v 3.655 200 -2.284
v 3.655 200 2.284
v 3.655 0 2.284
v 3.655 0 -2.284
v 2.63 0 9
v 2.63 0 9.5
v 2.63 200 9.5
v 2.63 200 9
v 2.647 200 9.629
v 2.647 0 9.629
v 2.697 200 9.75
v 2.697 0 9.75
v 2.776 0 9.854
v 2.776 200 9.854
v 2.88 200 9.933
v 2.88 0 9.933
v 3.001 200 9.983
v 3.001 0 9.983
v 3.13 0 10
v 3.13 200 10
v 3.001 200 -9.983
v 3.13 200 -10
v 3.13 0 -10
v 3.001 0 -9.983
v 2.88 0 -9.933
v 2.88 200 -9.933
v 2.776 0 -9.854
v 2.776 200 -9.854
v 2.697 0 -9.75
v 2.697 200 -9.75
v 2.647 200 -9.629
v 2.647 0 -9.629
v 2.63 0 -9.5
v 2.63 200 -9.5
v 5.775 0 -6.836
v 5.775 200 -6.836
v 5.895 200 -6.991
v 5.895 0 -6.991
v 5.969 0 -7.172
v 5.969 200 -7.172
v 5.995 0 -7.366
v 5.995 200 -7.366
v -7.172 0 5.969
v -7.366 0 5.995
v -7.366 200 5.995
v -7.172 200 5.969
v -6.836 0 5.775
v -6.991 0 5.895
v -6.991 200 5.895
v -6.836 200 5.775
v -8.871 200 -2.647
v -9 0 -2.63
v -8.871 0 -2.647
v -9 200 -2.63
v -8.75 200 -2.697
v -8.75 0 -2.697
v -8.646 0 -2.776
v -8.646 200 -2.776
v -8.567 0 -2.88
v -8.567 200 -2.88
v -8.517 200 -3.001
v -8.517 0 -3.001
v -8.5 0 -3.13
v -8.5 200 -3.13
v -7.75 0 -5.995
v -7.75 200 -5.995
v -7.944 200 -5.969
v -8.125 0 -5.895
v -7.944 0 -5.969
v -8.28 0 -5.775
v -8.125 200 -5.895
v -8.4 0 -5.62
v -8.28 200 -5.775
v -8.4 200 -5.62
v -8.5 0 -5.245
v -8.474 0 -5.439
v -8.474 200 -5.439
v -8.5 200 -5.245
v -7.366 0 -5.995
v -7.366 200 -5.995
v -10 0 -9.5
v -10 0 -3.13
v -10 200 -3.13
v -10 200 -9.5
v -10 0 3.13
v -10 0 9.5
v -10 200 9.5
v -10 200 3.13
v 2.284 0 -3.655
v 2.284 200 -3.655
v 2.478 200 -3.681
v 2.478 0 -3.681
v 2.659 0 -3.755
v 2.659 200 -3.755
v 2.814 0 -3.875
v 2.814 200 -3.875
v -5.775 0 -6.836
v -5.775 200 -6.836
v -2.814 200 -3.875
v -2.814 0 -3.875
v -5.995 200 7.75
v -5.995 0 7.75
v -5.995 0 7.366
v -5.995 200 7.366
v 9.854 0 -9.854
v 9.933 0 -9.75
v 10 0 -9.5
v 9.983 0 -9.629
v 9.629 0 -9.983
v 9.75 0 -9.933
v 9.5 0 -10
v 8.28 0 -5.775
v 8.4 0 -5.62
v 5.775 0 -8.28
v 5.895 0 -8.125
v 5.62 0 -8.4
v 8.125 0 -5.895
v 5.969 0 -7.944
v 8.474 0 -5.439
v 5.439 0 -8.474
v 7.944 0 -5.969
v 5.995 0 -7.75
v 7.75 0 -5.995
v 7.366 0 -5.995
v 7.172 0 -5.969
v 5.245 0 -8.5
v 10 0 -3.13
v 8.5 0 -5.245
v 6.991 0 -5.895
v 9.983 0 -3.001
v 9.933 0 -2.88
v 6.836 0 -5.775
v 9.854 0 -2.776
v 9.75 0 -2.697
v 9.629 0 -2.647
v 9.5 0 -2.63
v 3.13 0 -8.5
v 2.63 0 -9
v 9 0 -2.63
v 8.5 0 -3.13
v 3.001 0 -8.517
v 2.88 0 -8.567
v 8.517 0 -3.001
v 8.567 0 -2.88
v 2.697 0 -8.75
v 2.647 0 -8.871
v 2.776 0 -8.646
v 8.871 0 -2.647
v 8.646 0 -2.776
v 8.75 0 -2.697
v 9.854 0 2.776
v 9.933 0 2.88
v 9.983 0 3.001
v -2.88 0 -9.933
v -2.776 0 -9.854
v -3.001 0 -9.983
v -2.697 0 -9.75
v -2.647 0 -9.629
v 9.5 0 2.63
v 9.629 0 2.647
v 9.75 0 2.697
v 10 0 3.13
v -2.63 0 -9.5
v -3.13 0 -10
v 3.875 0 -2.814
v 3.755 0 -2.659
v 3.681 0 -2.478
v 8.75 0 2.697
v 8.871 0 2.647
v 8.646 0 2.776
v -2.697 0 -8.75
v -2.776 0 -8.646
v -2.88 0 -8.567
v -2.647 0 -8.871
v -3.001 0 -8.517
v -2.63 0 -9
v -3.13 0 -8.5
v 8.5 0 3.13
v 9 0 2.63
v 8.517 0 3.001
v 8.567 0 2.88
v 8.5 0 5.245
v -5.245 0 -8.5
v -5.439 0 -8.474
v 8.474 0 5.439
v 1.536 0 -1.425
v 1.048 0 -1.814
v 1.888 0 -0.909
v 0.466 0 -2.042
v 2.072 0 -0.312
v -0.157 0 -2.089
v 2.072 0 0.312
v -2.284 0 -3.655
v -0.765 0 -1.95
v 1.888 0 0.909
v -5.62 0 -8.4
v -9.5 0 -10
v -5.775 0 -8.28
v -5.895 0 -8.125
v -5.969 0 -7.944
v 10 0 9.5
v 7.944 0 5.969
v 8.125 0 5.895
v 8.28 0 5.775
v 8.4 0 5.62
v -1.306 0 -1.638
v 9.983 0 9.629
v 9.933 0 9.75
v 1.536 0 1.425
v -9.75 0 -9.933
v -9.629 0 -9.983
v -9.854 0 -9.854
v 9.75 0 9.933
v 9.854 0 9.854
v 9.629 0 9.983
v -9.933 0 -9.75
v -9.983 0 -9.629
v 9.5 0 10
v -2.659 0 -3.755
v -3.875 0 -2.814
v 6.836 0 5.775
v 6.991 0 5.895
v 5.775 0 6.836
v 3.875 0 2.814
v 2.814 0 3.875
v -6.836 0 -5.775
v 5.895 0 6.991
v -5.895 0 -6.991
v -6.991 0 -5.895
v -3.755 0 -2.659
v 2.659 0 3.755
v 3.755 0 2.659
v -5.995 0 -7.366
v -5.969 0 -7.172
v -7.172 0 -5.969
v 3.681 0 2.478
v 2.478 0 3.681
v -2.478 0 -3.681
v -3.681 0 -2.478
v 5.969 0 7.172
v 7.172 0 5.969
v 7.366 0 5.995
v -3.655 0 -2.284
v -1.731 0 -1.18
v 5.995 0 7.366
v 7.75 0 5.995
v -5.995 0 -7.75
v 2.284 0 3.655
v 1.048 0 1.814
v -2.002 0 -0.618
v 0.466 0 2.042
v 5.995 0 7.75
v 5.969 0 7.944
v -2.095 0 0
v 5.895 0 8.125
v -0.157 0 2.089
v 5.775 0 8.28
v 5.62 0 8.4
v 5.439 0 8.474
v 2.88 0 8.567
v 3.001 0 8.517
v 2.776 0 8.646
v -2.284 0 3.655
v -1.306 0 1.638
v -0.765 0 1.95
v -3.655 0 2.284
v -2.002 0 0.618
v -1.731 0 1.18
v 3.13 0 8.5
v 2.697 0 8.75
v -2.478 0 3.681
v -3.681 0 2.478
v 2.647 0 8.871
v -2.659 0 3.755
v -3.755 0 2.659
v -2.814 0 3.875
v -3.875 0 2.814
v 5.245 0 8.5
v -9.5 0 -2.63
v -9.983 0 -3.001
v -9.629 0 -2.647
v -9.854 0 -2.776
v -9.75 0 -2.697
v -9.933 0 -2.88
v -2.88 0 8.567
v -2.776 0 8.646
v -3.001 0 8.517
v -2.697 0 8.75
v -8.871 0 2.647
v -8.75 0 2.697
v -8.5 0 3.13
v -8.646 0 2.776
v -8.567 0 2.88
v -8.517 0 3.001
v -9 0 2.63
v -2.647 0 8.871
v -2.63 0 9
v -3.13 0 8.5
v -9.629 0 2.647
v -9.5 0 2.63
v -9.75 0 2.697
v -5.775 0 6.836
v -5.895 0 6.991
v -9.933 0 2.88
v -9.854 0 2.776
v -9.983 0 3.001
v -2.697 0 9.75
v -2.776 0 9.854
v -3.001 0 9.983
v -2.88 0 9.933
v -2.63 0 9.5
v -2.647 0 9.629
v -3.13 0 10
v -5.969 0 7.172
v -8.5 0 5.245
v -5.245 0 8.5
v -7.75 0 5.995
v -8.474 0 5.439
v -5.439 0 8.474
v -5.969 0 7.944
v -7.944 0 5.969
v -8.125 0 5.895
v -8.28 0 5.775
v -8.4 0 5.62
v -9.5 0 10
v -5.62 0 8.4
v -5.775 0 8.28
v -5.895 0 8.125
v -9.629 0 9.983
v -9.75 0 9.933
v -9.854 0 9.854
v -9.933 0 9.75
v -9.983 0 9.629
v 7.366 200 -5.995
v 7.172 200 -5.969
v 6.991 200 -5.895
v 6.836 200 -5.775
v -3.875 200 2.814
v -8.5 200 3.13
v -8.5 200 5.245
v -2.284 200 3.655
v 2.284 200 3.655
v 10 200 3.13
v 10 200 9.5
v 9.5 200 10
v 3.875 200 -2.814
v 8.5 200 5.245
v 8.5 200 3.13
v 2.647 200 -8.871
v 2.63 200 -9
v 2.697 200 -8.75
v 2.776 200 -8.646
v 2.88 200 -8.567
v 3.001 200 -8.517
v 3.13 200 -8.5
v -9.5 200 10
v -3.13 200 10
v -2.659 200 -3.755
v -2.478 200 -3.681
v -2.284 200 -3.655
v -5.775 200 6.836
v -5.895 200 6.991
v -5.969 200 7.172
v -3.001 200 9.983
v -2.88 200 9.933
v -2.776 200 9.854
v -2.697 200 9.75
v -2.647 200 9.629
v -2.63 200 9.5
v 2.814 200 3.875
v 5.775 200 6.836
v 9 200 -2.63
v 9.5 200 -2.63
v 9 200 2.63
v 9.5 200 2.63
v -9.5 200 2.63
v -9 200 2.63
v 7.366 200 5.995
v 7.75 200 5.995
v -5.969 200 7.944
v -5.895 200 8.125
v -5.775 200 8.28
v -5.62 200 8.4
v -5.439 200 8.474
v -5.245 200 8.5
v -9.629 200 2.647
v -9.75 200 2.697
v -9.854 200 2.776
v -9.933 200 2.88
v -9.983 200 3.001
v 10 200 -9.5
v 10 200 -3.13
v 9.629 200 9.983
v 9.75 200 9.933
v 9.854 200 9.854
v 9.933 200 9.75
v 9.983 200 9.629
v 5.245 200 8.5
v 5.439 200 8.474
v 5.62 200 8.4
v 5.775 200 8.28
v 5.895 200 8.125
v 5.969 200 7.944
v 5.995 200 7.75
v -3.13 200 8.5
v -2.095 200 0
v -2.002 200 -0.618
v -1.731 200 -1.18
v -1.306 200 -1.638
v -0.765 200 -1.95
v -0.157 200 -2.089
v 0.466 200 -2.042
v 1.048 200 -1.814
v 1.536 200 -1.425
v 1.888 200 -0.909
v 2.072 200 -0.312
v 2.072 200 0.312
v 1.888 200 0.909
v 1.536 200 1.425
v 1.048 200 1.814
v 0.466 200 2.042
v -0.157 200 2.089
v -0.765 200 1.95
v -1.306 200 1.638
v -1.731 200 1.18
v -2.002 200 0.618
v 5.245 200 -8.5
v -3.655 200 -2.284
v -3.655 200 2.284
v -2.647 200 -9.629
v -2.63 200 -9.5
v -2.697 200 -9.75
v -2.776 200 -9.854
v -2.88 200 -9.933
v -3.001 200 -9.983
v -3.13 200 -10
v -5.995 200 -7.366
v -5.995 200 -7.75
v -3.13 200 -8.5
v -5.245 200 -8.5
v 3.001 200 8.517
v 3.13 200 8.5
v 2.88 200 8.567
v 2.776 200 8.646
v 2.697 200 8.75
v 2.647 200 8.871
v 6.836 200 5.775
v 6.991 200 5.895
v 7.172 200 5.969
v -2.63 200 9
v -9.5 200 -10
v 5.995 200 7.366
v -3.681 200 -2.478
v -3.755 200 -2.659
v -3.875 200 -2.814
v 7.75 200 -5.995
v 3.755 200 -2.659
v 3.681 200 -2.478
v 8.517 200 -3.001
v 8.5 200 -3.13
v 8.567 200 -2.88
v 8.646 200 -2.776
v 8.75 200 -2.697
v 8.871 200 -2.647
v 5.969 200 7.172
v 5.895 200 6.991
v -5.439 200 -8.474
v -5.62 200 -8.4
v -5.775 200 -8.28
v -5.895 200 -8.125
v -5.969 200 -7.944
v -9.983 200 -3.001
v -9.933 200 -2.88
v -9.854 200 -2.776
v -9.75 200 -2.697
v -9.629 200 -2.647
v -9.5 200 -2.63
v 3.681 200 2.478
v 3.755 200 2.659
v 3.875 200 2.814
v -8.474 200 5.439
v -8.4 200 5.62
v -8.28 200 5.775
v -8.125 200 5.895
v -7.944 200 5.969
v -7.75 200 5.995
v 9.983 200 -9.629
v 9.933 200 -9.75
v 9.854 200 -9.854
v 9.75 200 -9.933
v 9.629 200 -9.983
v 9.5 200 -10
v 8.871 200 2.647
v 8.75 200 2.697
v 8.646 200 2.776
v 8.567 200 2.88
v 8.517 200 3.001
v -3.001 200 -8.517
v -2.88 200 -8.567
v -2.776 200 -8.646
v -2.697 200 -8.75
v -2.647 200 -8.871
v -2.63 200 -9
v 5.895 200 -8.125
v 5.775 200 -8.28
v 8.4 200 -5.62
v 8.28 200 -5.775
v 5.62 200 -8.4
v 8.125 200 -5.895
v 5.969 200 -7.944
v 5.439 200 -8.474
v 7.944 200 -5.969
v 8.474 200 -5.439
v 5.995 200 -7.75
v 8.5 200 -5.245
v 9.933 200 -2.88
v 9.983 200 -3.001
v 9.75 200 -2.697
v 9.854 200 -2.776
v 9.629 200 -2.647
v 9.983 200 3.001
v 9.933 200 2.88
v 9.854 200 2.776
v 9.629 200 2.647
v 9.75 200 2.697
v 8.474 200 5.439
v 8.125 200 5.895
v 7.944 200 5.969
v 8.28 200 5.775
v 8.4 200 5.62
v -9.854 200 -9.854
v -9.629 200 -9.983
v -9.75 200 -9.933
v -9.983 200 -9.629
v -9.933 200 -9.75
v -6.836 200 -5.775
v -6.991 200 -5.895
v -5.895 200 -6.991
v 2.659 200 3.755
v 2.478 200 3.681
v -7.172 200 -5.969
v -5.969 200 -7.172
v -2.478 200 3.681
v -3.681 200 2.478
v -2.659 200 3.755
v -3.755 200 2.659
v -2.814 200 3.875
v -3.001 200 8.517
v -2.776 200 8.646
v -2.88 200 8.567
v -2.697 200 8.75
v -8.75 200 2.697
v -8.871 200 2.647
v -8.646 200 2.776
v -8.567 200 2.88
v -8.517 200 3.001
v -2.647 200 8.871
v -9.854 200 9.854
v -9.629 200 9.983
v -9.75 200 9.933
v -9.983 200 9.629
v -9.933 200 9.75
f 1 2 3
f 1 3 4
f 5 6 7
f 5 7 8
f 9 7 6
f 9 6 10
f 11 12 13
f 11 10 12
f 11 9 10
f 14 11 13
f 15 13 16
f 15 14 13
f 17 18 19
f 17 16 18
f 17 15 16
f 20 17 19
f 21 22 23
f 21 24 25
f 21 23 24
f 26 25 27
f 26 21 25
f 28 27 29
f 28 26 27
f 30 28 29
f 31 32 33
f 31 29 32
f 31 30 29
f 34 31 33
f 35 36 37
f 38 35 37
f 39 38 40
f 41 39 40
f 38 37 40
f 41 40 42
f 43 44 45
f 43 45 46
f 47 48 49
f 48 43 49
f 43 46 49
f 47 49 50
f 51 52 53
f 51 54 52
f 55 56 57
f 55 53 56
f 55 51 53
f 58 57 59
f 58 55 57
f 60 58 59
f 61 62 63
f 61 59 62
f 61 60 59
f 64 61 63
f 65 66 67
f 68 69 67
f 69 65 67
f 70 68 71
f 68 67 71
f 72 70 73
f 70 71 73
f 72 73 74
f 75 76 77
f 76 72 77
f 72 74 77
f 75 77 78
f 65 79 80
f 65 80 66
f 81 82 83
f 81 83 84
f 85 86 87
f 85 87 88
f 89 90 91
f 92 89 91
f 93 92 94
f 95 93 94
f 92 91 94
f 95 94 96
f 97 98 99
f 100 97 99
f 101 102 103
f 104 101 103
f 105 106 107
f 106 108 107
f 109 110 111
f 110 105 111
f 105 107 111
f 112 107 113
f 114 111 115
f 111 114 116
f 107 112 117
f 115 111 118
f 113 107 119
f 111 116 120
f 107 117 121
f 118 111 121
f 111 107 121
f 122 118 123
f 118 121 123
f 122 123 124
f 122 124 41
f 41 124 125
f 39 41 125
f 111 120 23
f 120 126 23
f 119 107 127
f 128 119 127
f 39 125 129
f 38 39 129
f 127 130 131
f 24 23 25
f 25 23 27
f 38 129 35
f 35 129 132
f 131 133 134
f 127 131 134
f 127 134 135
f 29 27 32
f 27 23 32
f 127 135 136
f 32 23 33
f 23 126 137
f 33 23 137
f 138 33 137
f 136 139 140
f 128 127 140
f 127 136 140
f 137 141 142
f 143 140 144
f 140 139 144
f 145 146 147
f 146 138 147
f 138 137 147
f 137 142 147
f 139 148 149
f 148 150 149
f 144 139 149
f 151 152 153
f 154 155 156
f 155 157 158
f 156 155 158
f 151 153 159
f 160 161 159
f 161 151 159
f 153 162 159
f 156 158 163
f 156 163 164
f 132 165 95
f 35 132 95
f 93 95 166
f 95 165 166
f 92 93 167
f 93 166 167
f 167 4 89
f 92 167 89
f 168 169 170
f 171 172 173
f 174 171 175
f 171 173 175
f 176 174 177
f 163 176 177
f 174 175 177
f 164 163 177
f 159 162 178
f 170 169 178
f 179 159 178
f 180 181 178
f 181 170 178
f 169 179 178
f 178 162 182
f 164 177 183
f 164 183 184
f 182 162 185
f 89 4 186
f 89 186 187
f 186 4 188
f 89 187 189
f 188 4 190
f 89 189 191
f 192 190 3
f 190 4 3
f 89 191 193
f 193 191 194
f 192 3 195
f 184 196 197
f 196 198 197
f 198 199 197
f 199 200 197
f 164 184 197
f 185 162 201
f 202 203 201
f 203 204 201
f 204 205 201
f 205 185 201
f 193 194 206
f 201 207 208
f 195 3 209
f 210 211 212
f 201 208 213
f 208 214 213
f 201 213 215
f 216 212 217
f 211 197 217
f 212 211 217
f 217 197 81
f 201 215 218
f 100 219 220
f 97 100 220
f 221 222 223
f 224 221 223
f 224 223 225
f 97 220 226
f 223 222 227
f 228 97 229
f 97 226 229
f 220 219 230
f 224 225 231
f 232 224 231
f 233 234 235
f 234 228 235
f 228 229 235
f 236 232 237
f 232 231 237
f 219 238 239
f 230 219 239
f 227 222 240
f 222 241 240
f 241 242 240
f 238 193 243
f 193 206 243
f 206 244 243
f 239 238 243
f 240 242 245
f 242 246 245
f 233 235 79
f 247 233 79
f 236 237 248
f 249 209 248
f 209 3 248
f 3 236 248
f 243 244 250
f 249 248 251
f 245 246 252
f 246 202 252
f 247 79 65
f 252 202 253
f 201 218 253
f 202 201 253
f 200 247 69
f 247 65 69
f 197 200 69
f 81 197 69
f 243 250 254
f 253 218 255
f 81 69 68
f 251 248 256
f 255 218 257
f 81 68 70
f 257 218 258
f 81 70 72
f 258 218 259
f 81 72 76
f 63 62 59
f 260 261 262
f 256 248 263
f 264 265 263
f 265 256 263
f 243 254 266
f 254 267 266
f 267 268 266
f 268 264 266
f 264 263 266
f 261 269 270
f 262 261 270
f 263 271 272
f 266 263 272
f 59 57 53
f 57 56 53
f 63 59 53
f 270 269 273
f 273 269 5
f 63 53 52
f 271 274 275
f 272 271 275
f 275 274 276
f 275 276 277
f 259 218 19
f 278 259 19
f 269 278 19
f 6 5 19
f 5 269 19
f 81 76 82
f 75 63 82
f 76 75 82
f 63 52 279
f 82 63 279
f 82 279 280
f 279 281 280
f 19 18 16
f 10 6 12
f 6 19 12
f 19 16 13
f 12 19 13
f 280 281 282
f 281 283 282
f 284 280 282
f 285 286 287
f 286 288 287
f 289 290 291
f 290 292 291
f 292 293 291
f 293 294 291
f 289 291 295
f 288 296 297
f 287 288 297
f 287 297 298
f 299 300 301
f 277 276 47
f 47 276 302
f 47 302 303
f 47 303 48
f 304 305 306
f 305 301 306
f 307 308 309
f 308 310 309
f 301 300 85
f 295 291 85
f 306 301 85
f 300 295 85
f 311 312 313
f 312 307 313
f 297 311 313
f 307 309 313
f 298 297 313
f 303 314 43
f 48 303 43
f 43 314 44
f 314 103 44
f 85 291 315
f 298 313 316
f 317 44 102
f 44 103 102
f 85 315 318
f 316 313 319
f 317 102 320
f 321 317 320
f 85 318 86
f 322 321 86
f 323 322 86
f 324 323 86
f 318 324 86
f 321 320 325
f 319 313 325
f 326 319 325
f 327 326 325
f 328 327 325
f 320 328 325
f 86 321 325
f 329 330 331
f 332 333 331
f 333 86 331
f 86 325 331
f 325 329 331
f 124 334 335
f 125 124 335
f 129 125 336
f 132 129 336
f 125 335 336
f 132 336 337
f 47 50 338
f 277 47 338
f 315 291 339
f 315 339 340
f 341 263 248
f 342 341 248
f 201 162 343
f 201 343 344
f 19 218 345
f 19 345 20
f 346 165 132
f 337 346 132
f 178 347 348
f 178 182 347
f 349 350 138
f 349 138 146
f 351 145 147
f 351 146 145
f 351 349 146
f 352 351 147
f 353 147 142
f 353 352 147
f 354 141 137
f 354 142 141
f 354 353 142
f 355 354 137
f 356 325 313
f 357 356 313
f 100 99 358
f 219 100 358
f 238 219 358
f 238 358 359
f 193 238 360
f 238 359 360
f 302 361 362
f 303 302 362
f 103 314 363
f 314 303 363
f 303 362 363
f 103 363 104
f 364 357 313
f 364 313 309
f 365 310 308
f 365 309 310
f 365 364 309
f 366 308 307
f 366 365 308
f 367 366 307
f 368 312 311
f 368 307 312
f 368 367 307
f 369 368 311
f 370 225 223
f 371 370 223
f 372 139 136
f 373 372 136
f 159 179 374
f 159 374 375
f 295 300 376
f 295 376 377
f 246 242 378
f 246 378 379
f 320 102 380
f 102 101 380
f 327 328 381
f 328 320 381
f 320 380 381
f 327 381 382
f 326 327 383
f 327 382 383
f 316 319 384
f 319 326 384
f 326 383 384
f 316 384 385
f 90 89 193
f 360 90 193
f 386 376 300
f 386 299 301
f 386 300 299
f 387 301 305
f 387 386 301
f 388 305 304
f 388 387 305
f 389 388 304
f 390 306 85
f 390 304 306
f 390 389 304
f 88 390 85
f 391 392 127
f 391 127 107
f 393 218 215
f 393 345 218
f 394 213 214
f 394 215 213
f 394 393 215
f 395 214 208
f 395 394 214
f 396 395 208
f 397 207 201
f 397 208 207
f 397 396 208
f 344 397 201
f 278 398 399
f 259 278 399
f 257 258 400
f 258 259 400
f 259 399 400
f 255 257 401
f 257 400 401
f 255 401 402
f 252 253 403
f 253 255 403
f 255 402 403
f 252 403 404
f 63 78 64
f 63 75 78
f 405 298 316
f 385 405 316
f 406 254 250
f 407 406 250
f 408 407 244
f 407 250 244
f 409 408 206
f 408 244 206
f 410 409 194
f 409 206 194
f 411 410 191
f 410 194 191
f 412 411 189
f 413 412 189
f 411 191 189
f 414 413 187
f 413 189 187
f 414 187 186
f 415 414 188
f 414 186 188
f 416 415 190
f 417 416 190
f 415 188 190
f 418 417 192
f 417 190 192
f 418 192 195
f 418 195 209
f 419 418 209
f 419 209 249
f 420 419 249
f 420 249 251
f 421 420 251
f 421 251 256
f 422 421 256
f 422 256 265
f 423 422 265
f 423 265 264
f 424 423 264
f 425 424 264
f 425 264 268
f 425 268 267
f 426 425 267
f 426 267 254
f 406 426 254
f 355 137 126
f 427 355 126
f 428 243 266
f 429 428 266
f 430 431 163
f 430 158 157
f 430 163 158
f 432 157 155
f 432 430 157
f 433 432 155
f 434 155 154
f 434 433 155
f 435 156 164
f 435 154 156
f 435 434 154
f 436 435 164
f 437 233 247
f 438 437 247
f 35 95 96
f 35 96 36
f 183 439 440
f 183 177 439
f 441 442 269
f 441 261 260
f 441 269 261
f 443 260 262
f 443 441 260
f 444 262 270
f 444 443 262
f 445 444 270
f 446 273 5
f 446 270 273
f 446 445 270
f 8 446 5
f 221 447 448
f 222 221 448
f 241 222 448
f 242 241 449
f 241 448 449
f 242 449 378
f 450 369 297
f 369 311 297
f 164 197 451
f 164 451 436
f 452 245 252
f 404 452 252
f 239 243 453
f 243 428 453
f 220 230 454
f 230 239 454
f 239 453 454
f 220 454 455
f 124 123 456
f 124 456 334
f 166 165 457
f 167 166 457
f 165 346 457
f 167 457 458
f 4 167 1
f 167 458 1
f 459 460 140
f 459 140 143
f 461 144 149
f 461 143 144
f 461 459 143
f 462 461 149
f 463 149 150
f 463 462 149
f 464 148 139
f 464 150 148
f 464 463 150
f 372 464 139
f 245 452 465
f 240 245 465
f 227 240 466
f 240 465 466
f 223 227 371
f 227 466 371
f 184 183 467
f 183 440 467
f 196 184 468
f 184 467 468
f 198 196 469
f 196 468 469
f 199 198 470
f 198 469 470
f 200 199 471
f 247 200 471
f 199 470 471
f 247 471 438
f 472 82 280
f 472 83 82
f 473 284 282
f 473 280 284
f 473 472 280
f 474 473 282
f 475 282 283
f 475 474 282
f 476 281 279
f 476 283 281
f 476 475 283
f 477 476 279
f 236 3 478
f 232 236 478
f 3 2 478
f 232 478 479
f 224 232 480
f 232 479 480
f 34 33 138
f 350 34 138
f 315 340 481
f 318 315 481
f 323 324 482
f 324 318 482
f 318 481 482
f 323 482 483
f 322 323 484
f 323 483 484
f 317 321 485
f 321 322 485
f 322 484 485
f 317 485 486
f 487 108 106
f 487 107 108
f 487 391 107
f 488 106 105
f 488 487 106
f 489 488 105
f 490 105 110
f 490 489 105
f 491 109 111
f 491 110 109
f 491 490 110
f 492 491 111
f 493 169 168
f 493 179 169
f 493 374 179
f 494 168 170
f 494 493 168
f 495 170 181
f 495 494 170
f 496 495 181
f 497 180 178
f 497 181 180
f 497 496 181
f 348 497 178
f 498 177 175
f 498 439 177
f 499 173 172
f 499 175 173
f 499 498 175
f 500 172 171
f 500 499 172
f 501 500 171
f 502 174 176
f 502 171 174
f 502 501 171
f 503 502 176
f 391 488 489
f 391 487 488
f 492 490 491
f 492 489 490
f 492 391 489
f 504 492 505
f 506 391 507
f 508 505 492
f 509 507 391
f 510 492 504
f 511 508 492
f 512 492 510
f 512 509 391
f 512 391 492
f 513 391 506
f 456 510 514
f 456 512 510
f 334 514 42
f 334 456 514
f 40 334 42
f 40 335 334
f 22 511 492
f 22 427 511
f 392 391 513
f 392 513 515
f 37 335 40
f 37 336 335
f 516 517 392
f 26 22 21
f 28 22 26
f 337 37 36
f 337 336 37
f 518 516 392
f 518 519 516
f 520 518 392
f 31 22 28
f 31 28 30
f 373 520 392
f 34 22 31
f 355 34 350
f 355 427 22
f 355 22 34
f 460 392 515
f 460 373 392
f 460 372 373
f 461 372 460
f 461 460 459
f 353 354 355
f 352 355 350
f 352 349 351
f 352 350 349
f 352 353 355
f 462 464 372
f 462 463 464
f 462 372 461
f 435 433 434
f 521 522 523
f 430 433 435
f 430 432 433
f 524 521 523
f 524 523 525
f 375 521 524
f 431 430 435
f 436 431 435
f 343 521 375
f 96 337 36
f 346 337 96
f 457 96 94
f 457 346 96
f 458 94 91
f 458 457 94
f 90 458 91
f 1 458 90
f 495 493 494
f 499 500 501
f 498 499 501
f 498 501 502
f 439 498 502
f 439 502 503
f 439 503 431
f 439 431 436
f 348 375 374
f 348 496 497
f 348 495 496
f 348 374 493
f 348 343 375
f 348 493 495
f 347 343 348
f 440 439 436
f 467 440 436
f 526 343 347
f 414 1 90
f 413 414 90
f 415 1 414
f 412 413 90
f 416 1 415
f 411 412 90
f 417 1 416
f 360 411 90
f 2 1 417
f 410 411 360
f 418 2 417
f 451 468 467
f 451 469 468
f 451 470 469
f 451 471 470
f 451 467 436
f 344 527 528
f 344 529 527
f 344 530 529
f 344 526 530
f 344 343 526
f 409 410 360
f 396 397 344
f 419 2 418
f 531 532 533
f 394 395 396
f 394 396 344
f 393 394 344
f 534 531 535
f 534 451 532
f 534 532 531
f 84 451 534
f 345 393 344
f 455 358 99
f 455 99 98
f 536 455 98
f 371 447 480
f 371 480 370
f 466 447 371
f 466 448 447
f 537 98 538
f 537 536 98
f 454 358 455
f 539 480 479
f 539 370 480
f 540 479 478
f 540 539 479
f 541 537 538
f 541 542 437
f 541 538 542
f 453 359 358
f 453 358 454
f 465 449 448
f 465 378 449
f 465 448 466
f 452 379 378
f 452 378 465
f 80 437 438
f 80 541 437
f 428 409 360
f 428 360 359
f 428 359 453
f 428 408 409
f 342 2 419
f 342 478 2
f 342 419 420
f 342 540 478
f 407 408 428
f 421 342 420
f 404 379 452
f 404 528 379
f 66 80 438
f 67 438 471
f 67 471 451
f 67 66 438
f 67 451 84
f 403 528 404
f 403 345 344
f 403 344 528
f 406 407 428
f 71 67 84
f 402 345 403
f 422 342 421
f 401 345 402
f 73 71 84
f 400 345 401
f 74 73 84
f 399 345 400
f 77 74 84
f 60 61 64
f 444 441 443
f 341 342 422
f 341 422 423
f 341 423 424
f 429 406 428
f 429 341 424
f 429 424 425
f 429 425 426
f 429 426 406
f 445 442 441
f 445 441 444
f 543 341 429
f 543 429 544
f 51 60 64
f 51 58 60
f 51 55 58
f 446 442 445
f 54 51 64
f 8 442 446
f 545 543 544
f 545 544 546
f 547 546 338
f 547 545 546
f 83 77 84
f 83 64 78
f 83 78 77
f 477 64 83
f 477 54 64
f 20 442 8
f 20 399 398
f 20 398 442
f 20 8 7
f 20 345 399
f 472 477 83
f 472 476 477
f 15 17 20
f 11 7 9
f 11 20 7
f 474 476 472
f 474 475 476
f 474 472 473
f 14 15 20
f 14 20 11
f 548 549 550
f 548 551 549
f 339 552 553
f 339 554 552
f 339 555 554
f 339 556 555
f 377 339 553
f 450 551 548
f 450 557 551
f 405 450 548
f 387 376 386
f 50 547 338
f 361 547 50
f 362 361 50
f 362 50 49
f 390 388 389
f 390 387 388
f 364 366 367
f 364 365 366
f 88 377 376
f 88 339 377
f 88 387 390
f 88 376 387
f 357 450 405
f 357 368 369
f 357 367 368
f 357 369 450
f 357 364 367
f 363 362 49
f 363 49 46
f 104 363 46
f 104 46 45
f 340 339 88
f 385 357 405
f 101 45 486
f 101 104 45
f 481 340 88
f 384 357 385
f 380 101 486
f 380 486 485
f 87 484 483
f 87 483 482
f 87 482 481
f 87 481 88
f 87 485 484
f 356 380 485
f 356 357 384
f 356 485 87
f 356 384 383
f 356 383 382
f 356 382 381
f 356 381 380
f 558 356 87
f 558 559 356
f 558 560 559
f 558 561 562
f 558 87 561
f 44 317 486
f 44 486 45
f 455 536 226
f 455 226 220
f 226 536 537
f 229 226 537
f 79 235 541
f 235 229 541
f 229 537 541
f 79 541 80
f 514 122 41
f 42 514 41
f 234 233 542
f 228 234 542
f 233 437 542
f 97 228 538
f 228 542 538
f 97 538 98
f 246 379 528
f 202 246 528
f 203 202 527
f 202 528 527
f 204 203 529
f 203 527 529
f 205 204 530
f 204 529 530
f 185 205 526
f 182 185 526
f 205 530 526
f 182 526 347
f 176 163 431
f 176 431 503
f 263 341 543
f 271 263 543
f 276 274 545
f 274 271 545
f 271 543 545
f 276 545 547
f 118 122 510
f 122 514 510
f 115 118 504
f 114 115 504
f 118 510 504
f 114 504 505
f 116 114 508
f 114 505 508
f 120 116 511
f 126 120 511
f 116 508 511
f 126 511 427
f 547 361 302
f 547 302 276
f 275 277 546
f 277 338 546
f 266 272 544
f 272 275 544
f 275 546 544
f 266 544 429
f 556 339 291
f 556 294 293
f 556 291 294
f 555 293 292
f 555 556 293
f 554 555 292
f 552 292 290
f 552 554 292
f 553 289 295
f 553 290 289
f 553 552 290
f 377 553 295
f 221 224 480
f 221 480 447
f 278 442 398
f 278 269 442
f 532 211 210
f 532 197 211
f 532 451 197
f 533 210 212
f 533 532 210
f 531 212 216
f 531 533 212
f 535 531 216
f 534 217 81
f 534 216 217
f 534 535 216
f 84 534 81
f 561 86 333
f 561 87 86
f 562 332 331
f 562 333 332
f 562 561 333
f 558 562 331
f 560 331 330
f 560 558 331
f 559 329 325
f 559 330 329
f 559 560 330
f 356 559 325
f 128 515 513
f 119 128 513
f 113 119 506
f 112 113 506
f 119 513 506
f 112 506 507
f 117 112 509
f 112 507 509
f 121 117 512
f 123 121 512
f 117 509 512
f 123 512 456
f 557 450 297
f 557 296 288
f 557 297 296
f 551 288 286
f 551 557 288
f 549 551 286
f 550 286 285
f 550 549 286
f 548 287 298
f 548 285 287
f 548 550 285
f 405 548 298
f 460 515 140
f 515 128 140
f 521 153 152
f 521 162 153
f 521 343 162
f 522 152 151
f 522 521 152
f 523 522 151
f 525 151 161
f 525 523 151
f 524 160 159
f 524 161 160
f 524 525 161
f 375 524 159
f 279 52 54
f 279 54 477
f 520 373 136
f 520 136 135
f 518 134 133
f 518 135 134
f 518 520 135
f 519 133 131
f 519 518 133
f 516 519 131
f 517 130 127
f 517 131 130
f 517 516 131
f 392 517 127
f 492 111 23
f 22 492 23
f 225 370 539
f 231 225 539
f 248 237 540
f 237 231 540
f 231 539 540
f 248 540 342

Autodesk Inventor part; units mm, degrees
ref_plane "YZ Plane" through (0, 0, 0) normal (1, 0, 0) x (0, 1, 0)
ref_plane "XZ Plane" through (0, 0, 0) normal (0, 1, 0) x (-1, 0, 0)
ref_plane "XY Plane" through (0, 0, 0) normal (0, 0, 1) x (1, 0, 0)
sketch "Sketch1" plane through (0, 0, 0) normal (0, 1, 0) x (-1, 0, 0)
  line L0 (0, -14) -> (0, 14) projected
  line L1 (-14, 0) -> (14, 0) projected
  line L2 (14, 0) -> (-14, 0) projected
  line L3 (0, -14) -> (0, 14) projected
  line L4 (2.5943, 3.655) -> (-2.5943, 3.655)
  line L5 (-3.655, 2.5943) -> (-3.655, -2.5943)
  line L6 (-2.5943, -3.655) -> (2.5943, -3.655)
  line L7 (3.655, -2.5943) -> (3.655, 2.5943)
  line L8 (-3.655, 3.655) -> (3.655, -3.655) construction
  line L9 (10, 10) -> (10, 2.63)
  line L10 (10, 2.63) -> (8.5, 2.63)
  line L11 (10, 10) -> (2.63, 10)
  line L12 (2.63, 10) -> (2.63, 8.5)
  line L13 (-10, 10) -> (-2.63, 10)
  line L14 (-2.63, 10) -> (-2.63, 8.5)
  line L15 (-10, 8.5) -> (-10, 10)
  line L16 (-10, 10) -> (-8.5, 10)
  line L17 (-8.5, 2.63) -> (-10, 2.63)
  line L18 (-10, 2.63) -> (-10, 10)
  line L19 (-10, -10) -> (-8.5, -10)
  line L20 (-8.5, -2.63) -> (-10, -2.63)
  line L21 (-10, -2.63) -> (-10, -10)
  line L22 (-10, -10) -> (-2.63, -10)
  line L23 (-2.63, -10) -> (-2.63, -8.5)
  line L24 (-10, -8.5) -> (-10, -10)
  line L25 (10, -10) -> (8.5, -10)
  line L26 (8.5, -2.63) -> (10, -2.63)
  line L27 (10, -2.63) -> (10, -10)
  line L28 (10, -10) -> (2.63, -10)
  line L29 (2.63, -10) -> (2.63, -8.5)
  line L30 (10, -8.5) -> (10, -10)
  circle A0 centre (0, 0) radius 2.095
  line L31 (5.995, -10) -> (2.63, -10)
  line L32 (-2.63, -10) -> (-5.995, -10)
  line L33 (10, -10) -> (2.63, -10)
  line L34 (-2.63, -10) -> (-10, -10)
  line L35 (10, -5.995) -> (10, -2.63)
  line L36 (10, 2.63) -> (10, 5.995)
  line L37 (10, 10) -> (10, 2.63)
  line L38 (10, -2.63) -> (10, -10)
  line L39 (-5.995, 10) -> (-2.63, 10)
  line L40 (2.63, 10) -> (5.995, 10)
  line L41 (-10, 10) -> (-2.63, 10)
  line L42 (2.63, 10) -> (10, 10)
  line L43 (-10, 5.995) -> (-10, 2.63)
  line L44 (-10, -2.63) -> (-10, -5.995)
  line L45 (-10, -10) -> (-10, -2.63)
  line L46 (-10, 2.63) -> (-10, 10)
  line L47 (-2.63, -8.5) -> (-5.995, -8.5)
  line L48 (-8.5, -5.995) -> (-8.5, -2.63)
  line L49 (-8.5, -5.995) -> (-7.0557, -5.995)
  line L50 (-5.995, -8.5) -> (-5.995, -7.0557)
  line L51 (-5.995, 7.0557) -> (-5.995, 8.5)
  line L52 (2.63, 8.5) -> (5.995, 8.5)
  line L53 (8.5, 2.63) -> (8.5, 5.995)
  line L54 (8.5, 5.995) -> (7.0557, 5.995)
  line L55 (5.995, 8.5) -> (5.995, 7.0557)
  line L56 (2.63, -8.5) -> (5.995, -8.5)
  line L57 (9.5607, -8.5) -> (10, -8.5)
  line L58 (8.5, -10) -> (8.5, -9.5607)
  line L59 (8.5, -5.995) -> (8.5, -2.63)
  line L60 (7.0557, -5.995) -> (8.5, -5.995)
  line L61 (5.995, -7.0557) -> (5.995, -8.5)
  line L62 (3.655, 3.655) -> (-0.5303, -0.5303) construction
  line L63 (-1.4814, -1.4814) -> (-3.655, -3.655) construction
  line L64 (-8.5, 10) -> (-8.5, 9.5607)
  line L65 (-8.5, 5.995) -> (-8.5, 2.63)
  line L66 (-2.63, 8.5) -> (-5.995, 8.5)
  line L67 (-9.5607, 8.5) -> (-10, 8.5)
  line L68 (-7.0557, 5.995) -> (-8.5, 5.995)
  line L69 (-3.655, 2.5943) -> (-7.0557, 5.995)
  line L70 (-2.5943, 3.655) -> (-5.995, 7.0557)
  line L71 (5.995, 7.0557) -> (2.5943, 3.655)
  line L72 (7.0557, 5.995) -> (3.655, 2.5943)
  line L73 (7.0557, -5.995) -> (3.655, -2.5943)
  line L74 (5.995, -7.0557) -> (2.5943, -3.655)
  line L75 (-2.5943, -3.655) -> (-5.995, -7.0557)
  line L76 (-3.655, -2.5943) -> (-7.0557, -5.995)
  dimension "d26" = 4.19
  dimension "d0" = 20
  dimension "d1" = 20
  dimension "d2" = 7.31
  dimension "d3" = 7.31
  dimension "d4" = 20
  dimension "d5" = 11.99
  dimension "d6" = 11.99
  dimension "d11" = 7.37
  dimension "d12" = 1.5
  dimension "d13" = 7.37
  dimension "d14" = 1.5
  dimension "d15" = 7.37
  dimension "d16" = 1.5
  dimension "d17" = 7.37
  dimension "d18" = 1.5
  dimension "d19" = 7.37
  dimension "d20" = 7.37
  dimension "d21" = 1.5
  dimension "d22" = 1.5
  dimension "d23" = 7.37
  dimension "d24" = 7.37
  dimension "d25" = 1.5
extrude "Extrusion1" add sketch "Sketch1" along normal blind 200 contours L6 L75 L50 L47 L23 L22 L19 L21 L20 L48 L49 L76 L5 L1 A0 L0 | L0 A0 L1 L7 L73 L60 L59 L26 L27 L25 L28 L29 L56 L61 L74 L6 | L1 L5 L69 L68 L65 L17 L18 L15 L13 L14 L66 L51 L70 L4 L0 A0 | A0 L0 L4 L71 L55 L52 L12 L11 L9 L10 L53 L54 L72 L7 L1
fillet "Fillet1" radius 0.5 20 edges at (10, 100, 10) (2.63, 100, 10) (-2.63, 100, 10) (-2.63, 100, 8.5) (10, 100, 2.63) (8.5, 100, 2.63) (10, 100, -2.63) (8.5, 100, -2.63) (10, 100, -10) (2.63, 100, -8.5) (-2.63, 100, -10) (-2.63, 100, -8.5) (2.63, 100, -10) (-10, 100, -10) (-8.5, 100, -2.63) (-10, 100, -2.63) (-8.5, 100, 2.63) (-10, 100, 2.63) (-10, 100, 10) (2.63, 100, 8.5)
fillet "Fillet2" radius 0.75 24 edges at (-7.0557, 100, 5.995) (-3.655, 100, 2.5943) (-8.5, 100, -5.995) (-7.0557, 100, -5.995) (-5.995, 100, -8.5) (3.655, 100, -2.5943) (7.0557, 100, -5.995) (-2.5943, 100, 3.655) (-5.995, 100, 7.0557) (3.655, 100, 2.5943) (7.0557, 100, 5.995) (8.5, 100, 5.995) (8.5, 100, -5.995) (2.5943, 100, 3.655) (5.995, 100, 7.0557) (5.995, 100, 8.5) (-5.995, 100, 8.5) (-8.5, 100, 5.995) (2.5943, 100, -3.655) (5.995, 100, -7.0557) (5.995, 100, -8.5) (-5.995, 100, -7.0557) (-2.5943, 100, -3.655) (-3.655, 100, -2.5943)
properties part number "Profile_Len_160mm"
